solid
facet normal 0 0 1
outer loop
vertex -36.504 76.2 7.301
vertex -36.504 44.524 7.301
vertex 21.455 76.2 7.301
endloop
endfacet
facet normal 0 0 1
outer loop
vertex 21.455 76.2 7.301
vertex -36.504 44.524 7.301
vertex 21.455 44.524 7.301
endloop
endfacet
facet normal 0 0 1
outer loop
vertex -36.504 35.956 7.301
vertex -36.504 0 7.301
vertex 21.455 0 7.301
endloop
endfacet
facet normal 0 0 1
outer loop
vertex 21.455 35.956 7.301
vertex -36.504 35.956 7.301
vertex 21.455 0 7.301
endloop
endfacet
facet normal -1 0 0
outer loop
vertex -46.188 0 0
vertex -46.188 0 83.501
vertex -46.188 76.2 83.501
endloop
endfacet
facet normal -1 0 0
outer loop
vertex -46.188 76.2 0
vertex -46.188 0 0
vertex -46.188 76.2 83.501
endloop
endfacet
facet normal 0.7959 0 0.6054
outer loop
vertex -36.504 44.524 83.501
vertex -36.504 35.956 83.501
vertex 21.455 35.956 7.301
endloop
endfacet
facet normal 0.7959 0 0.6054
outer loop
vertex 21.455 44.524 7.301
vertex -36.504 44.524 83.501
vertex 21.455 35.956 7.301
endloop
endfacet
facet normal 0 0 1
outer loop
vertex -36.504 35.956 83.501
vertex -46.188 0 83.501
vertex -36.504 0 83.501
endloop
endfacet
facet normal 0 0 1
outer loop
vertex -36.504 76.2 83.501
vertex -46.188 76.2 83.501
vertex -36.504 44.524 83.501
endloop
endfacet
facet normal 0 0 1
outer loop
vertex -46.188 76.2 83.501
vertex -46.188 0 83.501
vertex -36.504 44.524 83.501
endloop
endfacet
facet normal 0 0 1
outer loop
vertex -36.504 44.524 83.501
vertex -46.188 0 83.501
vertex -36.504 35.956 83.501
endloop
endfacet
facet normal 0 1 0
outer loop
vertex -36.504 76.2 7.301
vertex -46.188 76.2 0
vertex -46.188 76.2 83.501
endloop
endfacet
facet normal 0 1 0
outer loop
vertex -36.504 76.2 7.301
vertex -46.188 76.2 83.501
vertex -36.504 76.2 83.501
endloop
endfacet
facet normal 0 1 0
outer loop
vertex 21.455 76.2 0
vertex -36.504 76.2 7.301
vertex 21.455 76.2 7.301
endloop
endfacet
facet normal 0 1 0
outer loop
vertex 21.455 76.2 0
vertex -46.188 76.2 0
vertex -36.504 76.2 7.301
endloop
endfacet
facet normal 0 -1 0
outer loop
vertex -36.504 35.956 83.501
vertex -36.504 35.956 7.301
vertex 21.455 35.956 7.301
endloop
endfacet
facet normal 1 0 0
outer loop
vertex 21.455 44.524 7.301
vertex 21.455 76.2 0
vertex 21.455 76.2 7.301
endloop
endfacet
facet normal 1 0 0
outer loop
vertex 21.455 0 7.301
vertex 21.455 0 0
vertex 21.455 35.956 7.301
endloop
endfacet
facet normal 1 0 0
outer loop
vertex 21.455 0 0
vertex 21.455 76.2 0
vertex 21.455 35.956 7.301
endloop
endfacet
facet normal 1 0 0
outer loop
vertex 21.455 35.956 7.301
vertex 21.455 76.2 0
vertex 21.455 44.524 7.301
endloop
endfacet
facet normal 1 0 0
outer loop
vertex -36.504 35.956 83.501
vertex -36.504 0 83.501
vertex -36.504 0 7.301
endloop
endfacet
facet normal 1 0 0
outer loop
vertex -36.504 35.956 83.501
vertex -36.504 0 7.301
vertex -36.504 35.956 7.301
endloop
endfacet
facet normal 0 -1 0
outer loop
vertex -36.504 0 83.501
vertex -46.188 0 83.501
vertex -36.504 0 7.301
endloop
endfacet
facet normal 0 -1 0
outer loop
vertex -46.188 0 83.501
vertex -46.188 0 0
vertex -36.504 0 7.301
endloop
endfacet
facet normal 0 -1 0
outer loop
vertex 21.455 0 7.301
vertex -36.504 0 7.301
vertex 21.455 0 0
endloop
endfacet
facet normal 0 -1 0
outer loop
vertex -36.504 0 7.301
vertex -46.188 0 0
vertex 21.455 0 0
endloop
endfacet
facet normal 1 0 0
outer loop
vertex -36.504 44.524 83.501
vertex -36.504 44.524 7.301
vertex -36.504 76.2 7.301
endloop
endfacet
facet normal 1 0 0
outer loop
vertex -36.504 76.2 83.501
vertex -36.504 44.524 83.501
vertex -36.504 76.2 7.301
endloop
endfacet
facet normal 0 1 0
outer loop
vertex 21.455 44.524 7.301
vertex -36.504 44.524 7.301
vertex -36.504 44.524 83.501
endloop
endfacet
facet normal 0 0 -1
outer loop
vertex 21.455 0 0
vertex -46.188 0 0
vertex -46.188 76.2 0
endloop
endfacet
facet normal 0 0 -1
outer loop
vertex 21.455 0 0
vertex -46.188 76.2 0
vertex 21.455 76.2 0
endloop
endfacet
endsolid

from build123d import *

# Parameters (mm, degrees)
F0_W     = 67.6434636116
F0_H     = 7.3007261381
F1_DEPTH = 76.2
F2_W     = 9.6846371889
F2_H     = 76.2
F3_DEPTH = 76.2
F4_W     = 57.9588264227
F4_H     = 8.5687600076
F5_DEPTH = 76.2
F7_DEPTH = 40.2453660319


with BuildPart() as f1:
    # F0 (on Front) → F1 (new body)
    with BuildSketch(Plane.XZ):
        with Locations((-12.3665370047, 3.650363069)):
            Rectangle(F0_W, F0_H)
    extrude(amount=-F1_DEPTH)

    # F2 (on face) → F3 (join)
    with BuildSketch(Plane.XY.offset(7.3007261381)):
        with Locations((-41.3459502161, 38.1)):
            Rectangle(F2_W, F2_H)
    extrude(amount=F3_DEPTH)

    # F4 (on face) → F5 (join)
    with BuildSketch(Plane.XY.offset(7.3007261381)):
        with Locations((-7.5242184103, 40.2400139719)):
            Rectangle(F4_W, F4_H)
    extrude(amount=F5_DEPTH)

    # F6 (on face) → F7 (cut, through all)
    with BuildSketch(Plane.XZ.offset(-35.9556339681)):
        Polygon((21.4551948011, 83.5007261381), (-36.5036316216, 83.5007261381), (21.4551948011, 7.3007261381), align=None)
    extrude(amount=-F7_DEPTH, mode=Mode.SUBTRACT)


solid = f1.part
